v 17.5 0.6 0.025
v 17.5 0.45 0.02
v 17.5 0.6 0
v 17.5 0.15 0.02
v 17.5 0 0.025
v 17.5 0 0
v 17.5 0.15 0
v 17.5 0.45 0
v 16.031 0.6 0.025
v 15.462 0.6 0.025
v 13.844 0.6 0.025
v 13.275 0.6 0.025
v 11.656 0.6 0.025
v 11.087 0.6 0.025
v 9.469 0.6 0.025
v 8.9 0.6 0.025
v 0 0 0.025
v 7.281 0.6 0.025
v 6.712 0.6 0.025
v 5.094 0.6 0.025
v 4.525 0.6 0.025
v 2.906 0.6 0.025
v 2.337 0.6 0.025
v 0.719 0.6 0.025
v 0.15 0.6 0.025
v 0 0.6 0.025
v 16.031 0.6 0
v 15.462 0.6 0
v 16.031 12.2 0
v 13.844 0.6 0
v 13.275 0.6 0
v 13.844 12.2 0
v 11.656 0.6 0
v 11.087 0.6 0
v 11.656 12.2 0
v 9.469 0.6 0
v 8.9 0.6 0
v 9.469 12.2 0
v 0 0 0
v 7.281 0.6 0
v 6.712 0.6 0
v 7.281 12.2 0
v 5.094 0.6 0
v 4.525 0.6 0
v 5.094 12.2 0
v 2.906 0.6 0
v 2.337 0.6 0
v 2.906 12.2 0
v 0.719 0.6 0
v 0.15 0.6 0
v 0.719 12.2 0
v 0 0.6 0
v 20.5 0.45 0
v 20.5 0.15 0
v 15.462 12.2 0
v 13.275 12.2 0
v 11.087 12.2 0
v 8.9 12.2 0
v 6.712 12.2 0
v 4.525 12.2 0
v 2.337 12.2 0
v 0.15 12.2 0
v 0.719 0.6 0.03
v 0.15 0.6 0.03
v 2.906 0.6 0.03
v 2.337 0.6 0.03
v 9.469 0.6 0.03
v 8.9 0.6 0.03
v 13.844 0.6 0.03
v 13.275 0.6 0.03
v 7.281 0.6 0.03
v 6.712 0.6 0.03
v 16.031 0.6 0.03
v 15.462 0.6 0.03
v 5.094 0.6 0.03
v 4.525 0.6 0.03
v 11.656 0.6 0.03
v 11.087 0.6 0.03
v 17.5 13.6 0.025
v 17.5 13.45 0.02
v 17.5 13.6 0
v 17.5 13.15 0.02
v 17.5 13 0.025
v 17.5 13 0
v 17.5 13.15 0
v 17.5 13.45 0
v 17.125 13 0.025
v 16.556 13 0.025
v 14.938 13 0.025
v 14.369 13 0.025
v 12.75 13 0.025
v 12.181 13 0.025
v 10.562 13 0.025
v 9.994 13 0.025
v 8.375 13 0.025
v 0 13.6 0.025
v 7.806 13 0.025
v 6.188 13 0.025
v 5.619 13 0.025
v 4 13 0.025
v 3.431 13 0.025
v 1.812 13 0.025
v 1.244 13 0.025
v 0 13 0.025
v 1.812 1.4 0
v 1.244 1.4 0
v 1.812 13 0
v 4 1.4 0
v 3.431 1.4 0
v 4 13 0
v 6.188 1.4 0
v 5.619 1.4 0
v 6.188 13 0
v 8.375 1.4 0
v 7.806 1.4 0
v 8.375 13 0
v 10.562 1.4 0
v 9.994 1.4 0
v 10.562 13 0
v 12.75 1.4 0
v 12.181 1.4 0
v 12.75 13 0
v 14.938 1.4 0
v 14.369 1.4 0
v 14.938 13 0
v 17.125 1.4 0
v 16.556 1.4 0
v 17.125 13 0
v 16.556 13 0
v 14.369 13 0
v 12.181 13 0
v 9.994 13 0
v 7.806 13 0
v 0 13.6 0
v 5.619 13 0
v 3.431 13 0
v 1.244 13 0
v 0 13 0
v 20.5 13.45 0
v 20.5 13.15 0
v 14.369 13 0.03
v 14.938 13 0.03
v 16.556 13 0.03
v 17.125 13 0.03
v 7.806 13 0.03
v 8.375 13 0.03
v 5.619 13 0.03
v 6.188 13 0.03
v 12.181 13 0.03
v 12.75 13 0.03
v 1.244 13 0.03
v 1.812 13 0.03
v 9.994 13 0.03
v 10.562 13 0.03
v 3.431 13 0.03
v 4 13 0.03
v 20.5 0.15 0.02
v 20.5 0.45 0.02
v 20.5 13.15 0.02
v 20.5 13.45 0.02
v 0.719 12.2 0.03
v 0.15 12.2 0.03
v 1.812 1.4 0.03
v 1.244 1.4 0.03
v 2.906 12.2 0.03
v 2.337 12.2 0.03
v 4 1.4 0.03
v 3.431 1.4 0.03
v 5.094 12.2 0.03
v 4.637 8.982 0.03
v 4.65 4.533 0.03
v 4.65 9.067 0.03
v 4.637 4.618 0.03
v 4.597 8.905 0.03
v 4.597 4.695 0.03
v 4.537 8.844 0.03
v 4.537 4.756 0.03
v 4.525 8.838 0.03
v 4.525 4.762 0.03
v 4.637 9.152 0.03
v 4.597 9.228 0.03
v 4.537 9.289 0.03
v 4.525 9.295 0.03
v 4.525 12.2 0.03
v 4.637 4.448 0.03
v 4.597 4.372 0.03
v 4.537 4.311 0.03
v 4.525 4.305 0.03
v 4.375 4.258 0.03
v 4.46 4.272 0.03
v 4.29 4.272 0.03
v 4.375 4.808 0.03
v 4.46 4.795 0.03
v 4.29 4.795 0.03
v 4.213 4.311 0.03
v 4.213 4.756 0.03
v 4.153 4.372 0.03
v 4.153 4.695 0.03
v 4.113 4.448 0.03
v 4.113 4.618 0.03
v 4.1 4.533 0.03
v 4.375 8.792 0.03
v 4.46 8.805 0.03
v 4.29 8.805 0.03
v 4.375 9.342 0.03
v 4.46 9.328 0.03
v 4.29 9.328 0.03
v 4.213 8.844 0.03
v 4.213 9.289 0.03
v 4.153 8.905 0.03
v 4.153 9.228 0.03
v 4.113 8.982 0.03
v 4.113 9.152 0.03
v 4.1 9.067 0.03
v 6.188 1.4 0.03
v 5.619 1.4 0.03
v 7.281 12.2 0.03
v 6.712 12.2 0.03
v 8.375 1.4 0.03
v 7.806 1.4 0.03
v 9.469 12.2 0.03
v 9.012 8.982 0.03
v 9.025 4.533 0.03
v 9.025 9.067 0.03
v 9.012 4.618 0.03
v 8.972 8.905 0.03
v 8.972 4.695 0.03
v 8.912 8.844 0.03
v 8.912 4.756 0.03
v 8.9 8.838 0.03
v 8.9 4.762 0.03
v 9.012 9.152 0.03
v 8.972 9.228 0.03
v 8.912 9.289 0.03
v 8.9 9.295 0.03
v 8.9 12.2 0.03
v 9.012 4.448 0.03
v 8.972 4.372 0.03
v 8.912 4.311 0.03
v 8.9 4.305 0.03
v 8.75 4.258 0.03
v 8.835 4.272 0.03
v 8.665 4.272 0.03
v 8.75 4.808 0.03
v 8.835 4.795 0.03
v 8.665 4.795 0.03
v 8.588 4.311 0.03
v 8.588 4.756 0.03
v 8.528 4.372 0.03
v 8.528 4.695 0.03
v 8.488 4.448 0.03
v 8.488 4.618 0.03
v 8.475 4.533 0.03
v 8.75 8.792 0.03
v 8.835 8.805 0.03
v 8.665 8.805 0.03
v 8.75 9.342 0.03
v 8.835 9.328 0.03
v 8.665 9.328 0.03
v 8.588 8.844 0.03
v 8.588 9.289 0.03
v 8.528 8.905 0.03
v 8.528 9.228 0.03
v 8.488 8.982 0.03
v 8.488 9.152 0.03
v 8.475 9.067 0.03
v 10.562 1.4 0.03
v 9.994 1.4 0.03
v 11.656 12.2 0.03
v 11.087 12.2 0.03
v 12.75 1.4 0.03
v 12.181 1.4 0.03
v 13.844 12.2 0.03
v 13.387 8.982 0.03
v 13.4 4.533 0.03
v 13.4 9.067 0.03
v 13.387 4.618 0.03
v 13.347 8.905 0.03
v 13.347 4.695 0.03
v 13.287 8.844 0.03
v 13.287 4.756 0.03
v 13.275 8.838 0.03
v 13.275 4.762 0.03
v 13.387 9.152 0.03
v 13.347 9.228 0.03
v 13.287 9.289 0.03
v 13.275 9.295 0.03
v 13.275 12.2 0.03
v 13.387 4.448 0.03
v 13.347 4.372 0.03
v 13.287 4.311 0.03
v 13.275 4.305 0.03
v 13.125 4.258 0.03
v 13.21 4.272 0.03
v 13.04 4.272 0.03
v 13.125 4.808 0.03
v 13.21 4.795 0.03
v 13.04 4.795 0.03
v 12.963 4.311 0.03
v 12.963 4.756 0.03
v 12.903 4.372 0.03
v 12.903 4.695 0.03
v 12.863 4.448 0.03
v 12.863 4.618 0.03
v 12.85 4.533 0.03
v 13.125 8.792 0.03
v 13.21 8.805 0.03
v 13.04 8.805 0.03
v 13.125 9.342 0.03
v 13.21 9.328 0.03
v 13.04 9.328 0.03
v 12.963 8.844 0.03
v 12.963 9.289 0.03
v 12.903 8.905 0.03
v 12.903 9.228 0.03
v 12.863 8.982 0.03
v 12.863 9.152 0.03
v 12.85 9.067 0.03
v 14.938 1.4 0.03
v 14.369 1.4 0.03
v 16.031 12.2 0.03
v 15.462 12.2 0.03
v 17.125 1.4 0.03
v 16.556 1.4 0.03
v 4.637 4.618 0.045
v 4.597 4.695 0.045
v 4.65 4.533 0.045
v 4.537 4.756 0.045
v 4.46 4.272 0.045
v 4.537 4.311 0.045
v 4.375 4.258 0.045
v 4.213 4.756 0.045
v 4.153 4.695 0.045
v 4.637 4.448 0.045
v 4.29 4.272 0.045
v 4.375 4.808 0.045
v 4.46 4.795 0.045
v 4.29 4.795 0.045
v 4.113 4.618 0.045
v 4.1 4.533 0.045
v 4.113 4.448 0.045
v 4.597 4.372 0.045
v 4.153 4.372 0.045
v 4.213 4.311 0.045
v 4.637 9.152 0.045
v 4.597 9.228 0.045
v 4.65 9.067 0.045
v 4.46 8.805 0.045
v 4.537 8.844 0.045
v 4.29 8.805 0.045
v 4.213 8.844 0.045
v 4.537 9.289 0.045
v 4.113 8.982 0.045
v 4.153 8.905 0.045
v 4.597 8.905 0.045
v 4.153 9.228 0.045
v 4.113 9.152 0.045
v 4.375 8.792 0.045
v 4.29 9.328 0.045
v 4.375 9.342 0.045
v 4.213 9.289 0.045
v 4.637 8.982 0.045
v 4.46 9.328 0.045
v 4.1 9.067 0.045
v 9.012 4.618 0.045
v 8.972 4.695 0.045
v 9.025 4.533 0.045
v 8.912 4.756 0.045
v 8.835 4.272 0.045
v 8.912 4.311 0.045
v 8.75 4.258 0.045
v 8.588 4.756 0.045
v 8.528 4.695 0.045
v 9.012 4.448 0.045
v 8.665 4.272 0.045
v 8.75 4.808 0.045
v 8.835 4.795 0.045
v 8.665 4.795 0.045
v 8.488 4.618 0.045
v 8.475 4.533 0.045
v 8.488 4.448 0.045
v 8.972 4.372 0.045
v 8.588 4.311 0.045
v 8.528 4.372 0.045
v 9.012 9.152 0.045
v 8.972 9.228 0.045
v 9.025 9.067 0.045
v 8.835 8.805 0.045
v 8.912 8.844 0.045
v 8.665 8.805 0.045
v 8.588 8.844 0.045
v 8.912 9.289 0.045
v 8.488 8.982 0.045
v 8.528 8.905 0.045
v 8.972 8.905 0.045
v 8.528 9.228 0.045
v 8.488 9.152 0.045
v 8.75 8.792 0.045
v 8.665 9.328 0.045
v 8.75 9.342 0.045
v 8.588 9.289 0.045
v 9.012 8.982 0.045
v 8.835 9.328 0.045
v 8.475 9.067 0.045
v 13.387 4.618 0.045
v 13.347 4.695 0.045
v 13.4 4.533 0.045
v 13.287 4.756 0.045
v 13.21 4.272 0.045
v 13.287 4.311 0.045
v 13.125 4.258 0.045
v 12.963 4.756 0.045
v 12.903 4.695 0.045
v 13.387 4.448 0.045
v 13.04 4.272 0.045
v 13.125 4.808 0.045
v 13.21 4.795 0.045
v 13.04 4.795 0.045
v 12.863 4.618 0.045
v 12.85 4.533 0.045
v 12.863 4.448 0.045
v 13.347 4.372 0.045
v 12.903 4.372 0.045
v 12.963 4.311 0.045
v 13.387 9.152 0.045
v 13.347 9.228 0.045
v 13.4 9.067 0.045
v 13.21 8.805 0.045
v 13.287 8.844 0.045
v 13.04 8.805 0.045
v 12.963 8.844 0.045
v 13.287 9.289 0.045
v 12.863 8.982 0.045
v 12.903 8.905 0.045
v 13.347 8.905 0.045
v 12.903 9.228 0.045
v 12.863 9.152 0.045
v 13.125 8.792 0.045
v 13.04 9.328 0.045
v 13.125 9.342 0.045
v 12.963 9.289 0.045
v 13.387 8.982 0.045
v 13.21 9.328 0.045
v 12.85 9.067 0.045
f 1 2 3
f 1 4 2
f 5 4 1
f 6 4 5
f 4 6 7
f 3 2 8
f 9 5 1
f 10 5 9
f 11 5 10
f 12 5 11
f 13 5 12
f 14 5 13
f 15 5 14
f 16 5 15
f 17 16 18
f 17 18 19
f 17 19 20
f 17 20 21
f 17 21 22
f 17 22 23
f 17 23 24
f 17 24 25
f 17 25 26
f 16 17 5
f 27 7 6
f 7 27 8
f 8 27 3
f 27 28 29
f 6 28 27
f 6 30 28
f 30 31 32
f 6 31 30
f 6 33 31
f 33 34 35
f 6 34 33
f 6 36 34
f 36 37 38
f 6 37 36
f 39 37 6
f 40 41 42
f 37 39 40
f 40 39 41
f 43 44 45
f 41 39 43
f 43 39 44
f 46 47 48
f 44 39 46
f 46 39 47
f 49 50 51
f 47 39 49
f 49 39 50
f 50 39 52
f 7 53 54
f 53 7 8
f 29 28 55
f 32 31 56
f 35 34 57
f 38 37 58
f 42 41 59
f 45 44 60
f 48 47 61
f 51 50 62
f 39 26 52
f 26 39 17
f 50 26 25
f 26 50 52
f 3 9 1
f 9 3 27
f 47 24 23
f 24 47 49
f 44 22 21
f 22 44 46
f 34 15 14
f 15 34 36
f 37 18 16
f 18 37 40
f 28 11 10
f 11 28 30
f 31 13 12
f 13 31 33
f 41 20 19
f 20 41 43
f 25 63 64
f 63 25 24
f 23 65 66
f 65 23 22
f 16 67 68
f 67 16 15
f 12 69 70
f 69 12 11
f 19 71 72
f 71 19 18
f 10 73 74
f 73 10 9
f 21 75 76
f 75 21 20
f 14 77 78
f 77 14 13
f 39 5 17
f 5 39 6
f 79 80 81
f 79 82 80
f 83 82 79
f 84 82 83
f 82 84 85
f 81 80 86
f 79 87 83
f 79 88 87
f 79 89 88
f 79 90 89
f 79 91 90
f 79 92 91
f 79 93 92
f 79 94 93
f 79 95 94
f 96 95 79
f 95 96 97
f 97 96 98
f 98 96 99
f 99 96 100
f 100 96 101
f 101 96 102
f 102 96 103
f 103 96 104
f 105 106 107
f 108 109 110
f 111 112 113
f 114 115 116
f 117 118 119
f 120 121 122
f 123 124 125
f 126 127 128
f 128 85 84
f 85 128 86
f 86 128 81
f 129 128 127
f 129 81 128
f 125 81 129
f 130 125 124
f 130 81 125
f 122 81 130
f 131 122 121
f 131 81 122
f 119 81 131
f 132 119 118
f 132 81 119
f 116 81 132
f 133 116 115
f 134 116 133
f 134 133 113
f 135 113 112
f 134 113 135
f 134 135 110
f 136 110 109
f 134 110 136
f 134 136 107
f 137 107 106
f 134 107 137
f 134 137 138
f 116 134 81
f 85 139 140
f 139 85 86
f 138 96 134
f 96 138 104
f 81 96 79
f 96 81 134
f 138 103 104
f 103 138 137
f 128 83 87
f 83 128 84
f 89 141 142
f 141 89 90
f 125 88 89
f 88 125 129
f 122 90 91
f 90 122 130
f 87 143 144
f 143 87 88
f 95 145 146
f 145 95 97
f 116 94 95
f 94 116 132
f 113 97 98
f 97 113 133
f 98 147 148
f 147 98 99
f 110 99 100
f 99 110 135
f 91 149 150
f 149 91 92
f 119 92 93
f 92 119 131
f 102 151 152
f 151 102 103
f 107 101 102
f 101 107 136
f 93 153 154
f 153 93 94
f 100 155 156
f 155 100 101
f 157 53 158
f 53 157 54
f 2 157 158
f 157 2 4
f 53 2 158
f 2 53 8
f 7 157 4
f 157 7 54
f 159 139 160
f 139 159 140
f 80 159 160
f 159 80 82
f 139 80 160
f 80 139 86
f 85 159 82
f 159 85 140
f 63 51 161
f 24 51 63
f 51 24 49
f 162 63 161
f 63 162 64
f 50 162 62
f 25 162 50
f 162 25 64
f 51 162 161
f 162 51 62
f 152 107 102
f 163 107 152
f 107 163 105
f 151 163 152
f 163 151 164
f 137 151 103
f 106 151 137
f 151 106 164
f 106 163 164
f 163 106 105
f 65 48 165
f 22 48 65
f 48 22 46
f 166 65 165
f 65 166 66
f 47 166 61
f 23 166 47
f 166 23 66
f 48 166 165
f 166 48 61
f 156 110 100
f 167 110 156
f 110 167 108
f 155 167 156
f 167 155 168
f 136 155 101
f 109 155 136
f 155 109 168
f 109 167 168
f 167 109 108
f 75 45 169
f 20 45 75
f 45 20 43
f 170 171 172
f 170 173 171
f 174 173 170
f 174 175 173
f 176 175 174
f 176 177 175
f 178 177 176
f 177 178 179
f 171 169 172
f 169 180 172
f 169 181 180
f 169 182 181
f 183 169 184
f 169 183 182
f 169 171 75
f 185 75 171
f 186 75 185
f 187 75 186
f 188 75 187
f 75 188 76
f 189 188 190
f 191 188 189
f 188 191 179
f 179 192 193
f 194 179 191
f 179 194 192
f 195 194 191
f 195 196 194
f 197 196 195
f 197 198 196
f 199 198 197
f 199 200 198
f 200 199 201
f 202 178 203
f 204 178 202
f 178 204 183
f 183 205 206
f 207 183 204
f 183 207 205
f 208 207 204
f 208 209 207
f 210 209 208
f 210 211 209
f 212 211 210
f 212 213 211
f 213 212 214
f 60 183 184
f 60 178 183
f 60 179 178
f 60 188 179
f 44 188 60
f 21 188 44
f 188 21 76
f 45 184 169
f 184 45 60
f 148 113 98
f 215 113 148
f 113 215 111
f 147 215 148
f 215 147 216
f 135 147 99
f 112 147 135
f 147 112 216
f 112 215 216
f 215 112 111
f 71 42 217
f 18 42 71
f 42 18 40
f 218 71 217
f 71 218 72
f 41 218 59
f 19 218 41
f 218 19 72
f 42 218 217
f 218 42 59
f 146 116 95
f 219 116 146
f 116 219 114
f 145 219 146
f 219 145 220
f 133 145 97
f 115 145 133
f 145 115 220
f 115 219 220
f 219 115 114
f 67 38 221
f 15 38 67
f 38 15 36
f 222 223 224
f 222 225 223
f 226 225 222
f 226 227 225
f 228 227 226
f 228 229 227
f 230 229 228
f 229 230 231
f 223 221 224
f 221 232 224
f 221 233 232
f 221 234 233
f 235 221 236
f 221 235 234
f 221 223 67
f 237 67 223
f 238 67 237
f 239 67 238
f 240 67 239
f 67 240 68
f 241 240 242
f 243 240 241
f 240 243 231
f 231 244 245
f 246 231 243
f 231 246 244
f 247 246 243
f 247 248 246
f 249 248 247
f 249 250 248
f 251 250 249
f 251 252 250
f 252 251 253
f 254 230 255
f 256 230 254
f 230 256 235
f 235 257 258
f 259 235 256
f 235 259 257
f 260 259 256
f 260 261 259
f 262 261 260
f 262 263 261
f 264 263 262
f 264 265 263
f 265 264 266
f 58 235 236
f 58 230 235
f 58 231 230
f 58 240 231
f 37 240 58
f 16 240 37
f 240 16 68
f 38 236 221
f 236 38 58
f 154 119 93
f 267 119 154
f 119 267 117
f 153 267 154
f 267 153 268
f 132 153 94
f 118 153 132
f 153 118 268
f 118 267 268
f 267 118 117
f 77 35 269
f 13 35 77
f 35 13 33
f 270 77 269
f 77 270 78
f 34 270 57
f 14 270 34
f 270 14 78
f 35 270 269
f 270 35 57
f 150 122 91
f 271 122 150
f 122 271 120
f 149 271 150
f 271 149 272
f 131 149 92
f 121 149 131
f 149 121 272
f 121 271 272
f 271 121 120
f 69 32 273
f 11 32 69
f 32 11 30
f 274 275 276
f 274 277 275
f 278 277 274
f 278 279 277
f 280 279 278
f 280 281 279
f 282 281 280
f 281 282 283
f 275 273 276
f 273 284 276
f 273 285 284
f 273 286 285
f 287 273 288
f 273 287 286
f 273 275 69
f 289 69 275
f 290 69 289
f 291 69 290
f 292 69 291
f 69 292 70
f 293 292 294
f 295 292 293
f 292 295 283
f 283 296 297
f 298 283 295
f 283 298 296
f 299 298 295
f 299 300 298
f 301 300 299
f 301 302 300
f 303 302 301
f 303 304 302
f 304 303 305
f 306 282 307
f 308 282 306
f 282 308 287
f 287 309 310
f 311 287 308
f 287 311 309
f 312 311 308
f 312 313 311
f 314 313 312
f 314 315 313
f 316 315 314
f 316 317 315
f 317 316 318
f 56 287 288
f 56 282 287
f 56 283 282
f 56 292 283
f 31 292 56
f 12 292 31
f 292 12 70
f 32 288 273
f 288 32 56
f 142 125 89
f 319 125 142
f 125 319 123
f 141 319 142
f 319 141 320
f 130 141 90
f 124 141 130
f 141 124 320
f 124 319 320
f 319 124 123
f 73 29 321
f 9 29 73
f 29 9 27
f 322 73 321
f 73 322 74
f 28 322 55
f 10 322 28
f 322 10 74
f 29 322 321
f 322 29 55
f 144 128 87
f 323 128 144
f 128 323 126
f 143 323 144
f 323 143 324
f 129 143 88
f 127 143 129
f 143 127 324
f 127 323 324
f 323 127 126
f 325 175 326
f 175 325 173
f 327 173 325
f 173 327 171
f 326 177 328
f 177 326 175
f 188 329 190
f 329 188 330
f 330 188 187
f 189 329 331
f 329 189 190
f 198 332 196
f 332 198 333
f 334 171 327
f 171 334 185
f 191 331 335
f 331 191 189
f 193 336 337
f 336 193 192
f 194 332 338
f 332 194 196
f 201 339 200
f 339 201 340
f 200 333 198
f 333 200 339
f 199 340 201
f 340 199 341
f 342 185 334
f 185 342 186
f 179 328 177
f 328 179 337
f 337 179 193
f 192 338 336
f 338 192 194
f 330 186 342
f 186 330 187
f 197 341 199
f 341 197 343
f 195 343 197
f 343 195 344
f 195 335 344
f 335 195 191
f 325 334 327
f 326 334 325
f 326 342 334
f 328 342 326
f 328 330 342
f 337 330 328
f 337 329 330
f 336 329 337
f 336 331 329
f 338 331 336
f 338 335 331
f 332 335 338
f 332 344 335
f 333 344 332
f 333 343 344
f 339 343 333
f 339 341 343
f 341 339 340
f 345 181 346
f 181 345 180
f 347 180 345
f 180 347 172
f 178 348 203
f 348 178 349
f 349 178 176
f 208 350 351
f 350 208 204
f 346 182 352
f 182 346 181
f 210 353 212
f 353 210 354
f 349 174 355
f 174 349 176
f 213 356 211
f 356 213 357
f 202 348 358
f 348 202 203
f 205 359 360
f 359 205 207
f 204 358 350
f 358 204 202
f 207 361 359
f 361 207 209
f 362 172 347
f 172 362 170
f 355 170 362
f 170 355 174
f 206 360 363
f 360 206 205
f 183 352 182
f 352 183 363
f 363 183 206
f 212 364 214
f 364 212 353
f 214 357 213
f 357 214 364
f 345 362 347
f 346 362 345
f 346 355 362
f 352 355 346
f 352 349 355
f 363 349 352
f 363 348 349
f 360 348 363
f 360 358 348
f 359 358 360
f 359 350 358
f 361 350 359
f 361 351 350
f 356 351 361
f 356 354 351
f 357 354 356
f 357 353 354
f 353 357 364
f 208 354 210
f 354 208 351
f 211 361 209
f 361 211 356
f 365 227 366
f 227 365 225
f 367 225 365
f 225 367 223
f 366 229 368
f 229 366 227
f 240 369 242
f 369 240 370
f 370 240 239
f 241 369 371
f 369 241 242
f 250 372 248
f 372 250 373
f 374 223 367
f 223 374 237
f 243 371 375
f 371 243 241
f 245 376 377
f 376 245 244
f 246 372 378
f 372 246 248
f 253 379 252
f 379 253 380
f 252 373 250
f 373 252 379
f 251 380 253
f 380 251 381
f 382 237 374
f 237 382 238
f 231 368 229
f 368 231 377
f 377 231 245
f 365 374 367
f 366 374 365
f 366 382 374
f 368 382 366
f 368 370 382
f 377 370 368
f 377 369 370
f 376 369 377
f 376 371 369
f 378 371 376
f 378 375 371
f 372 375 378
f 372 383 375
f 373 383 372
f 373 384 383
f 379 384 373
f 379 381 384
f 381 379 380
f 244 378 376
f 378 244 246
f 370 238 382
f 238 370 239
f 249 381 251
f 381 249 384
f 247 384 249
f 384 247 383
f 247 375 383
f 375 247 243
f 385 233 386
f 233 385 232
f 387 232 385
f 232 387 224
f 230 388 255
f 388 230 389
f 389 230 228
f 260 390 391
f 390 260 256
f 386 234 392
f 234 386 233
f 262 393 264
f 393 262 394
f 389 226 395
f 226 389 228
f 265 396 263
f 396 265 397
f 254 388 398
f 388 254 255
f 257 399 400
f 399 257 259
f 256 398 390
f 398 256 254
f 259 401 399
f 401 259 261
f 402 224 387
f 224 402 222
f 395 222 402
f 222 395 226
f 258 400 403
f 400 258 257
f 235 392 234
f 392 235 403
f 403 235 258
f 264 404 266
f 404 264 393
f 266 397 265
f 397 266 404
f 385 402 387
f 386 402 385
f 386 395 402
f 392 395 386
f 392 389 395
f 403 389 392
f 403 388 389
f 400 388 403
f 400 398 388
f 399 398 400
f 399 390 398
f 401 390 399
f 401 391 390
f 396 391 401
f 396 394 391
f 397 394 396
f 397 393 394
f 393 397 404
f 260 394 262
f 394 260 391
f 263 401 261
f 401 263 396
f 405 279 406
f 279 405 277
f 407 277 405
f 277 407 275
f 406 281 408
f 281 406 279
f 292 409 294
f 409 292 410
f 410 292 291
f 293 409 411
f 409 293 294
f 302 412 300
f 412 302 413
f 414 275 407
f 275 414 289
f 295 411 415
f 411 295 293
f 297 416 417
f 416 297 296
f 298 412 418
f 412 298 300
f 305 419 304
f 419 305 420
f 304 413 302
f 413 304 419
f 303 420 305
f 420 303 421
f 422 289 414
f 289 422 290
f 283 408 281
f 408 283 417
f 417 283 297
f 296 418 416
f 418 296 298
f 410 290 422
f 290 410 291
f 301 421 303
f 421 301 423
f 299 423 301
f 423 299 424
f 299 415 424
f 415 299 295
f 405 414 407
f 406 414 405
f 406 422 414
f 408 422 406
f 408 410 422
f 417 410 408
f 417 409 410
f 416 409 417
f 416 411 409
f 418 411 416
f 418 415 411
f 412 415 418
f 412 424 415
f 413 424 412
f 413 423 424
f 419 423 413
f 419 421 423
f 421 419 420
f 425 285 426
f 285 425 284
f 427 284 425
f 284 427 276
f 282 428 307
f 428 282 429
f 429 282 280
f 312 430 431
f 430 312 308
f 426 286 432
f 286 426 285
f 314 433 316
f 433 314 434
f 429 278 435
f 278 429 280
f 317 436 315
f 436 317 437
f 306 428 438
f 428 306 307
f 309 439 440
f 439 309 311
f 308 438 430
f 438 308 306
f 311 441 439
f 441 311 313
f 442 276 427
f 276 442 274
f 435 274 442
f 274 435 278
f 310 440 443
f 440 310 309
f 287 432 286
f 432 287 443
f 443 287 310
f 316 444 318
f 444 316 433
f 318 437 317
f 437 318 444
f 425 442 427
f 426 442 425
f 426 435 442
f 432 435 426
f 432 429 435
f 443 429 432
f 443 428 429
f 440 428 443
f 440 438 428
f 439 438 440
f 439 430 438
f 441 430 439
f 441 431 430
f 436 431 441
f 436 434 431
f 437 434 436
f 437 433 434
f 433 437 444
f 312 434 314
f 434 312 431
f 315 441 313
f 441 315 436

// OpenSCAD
// file: ../Common/params.scad
// =========================================================================
// PencilAI - Common Parameters, Colors & Utility Library
// File: CAD Modelling/Common/params.scad
// =========================================================================

// --- Resolution Settings ---
$fn = 64;

// --- Physical Strip Dimensions (mm) ---
STRIP_LEN        = 54.0;   // Length of flexible tape (wraps ~1.9x on 9mm barrel)
STRIP_WID        = 20.0;   // Width of tape along the pen axis (grip zone height)
STRIP_CORNER_R   = 2.0;    // Rounded corner radius to prevent peeling

// --- Layer Heights & Z-Stackup (mm) ---
THICK_ADHESIVE   = 0.055;  // Skin-safe medical acrylic adhesive
THICK_KAPTON     = 0.025;  // Flexible Polyimide film substrate (25 um)
THICK_BASE       = THICK_ADHESIVE + THICK_KAPTON; // 0.080 mm base

THICK_COPPER     = 0.020;  // Etched copper traces (1/2 oz / 18-20 um)
THICK_GOLD       = 0.005;  // ENIG surface finish plating
THICK_CARBON     = 0.030;  // Screen-printed carbon resistive ink (30 um)
THICK_SPACER     = 0.015;  // Dielectric spacer dot height

THICK_TPU_SKIN   = 0.450;  // Translucent matte TPU outer protective grip film
THICK_TOTAL_MAX  = 0.530;  // Target total profile thickness: 0.53 mm

// --- Component Dimensions (mm) ---
// ST LIS2DH12 Ultra-low-power 3-axis accelerometer (WLCSP-12)
ACCEL_LEN        = 1.60;
ACCEL_WID        = 1.60;
ACCEL_H          = 0.40;   // Ultra-thin WLCSP package
ACCEL_BALL_PITCH = 0.40;   // 3x4 solder ball matrix
ACCEL_BALL_DIA   = 0.22;

// BLE Beacon SoC (InPlay IN100 / Nordic nRF52810 WLCSP)
BLE_LEN          = 2.20;
BLE_WID          = 2.20;
BLE_H            = 0.35;   // 0.35 mm profile
BLE_BALL_PITCH   = 0.45;   // 4x4 solder ball matrix
BLE_BALL_DIA     = 0.24;

// Ultra-Thin Printed Zinc-Manganese (Zn-Mn) Flexible Battery
BAT_LEN          = 16.5;   // Main pouch length
BAT_WID          = 12.6;   // Main pouch width
BAT_H            = 0.45;   // Printed paper battery thickness (0.45 mm)
BAT_SEAL_MARGIN  = 1.0;    // Perimeter foil crimp seal width
BAT_TAB_LEN      = 2.4;    // Terminal connector tab length
BAT_TAB_WID      = 1.2;    // Terminal tab width

// Interdigitated Carbon FSR Pinch Zone
FSR_LEN          = 17.5;
FSR_WID          = 13.6;
FSR_FINGERS      = 16;
FSR_BUS_WID      = 0.60;

// Serpentine 2.4 GHz Antenna
ANT_LOOPS        = 6;
ANT_STEP         = 1.40;
ANT_AMP          = 2.40;
ANT_TRACE_WID    = 0.35;

// Reference Pen
PEN_DIAMETER_DEFAULT = 9.0; // Standard ballpoint barrel (mm)

// --- Color Palette (RGBA) ---
C_KAPTON         = [0.85, 0.48, 0.08, 0.88]; // Translucent Amber Polyimide
C_ADHESIVE       = [0.95, 0.95, 0.92, 0.50]; // Clear skin-safe acrylic adhesive
C_RELEASE_LINER  = [0.98, 0.98, 0.96, 0.95]; // White silicone-coated pull tab
C_TPU_SKIN       = [0.18, 0.19, 0.22, 0.55]; // Translucent Charcoal Matte TPU
C_TPU_OPAQUE     = [0.14, 0.15, 0.17, 1.00]; // Grip ridges / tactile accents
C_COPPER         = [0.85, 0.45, 0.22, 1.00]; // Raw Etched Copper
C_GOLD           = [0.92, 0.74, 0.20, 1.00]; // ENIG Gold Plating
C_CARBON         = [0.12, 0.12, 0.13, 0.98]; // Screen-Printed Carbon Ink
C_DIELECTRIC     = [0.20, 0.65, 0.40, 0.75]; // Green/Teal Dielectric Spacer
C_SILICON        = [0.09, 0.10, 0.12, 1.00]; // WLCSP Mirror Silicon Die
C_SOLDER         = [0.76, 0.78, 0.82, 1.00]; // SAC305 Lead-Free Solder
C_CERAMIC        = [0.70, 0.58, 0.46, 1.00]; // 0201 MLCC Brown Ceramic
C_BATTERY_FOIL   = [0.80, 0.82, 0.85, 1.00]; // Hermetic Aluminum/Poly Pouch
C_BATTERY_SEAL   = [0.65, 0.67, 0.70, 1.00]; // Crimped Pouch Flange
C_BAT_ACCENT     = [0.15, 0.45, 0.75, 1.00]; // Insulator Layer / Branding
C_PEN_BARREL     = [0.93, 0.94, 0.96, 0.90]; // Smooth Polycarbonate Barrel
C_PEN_CHROME     = [0.84, 0.86, 0.89, 1.00]; // Mirror Chrome Trim
C_PEN_BRASS      = [0.86, 0.70, 0.28, 1.00]; // Machined Brass Tip Collar
C_PEN_BALL       = [0.35, 0.36, 0.38, 1.00]; // Tungsten Carbide Ball
C_PEN_INK        = [0.05, 0.10, 0.35, 1.00]; // Blue Ink Column inside refill

// --- Reusable Geometric Modules ---

// 2D Rounded Rectangle (Centered or Corner Origin)
module rounded_rect_2d(length, width, radius, center = false) {
    tx = center ? -length / 2 : 0;
    ty = center ? -width / 2 : 0;
    translate([tx, ty])
        offset(r = radius)
            offset(delta = -radius)
                square([length, width]);
}

// 3D Rounded Extruded Plate
module rounded_box(length, width, height, radius, center = false) {
    linear_extrude(height = height)
        rounded_rect_2d(length, width, radius, center = center);
}

// Spherical Solder Ball
module solder_ball(diameter) {
    color(C_SOLDER)
        sphere(d = diameter, $fn = 32);
}

// SMD 0201 / 01005 Passive Component (Capacitor / Inductor / Resistor)
module smd_passive_0201(len = 0.60, wid = 0.30, height = 0.30, body_color = C_CERAMIC) {
    term_len = 0.15;
    // Central Ceramic/Ferrite Body
    color(body_color)
        translate([term_len, 0, 0])
            cube([len - 2 * term_len, wid, height]);
    // Silver End Terminations
    color(C_SOLDER) {
        cube([term_len, wid, height]);
        translate([len - term_len, 0, 0])
            cube([term_len, wid, height]);
    }
}

// Circular Fiducial Alignment Marker (for high-precision flex assembly)
module fiducial_marker(diameter = 1.0, copper_h = THICK_COPPER) {
    color(C_GOLD)
        cylinder(d = diameter, h = copper_h, $fn = 32);
    color(C_KAPTON)
        difference() {
            cylinder(d = diameter * 2.2, h = copper_h + 0.001, $fn = 32);
            cylinder(d = diameter * 1.4, h = copper_h + 0.002, $fn = 32);
        }
}
// main file
// =========================================================================
// PencilAI - Interdigitated Carbon FSR Pressure Sensor
// File: CAD Modelling/Sensors/fsr_pressure_sensor.scad
// =========================================================================

include <../Common/params.scad>

// --- View Controls (when rendered directly) ---
show_busbars      = true;   // Gold outer collector busbars & lead traces
show_carbon_grid  = true;   // Interlocking screen-printed carbon-ink fingers
show_spacer_dots  = true;   // Dielectric micro-spacer dots for threshold control

module fsr_sensor(
    x = 0,
    y = 0,
    z = THICK_BASE,
    length = FSR_LEN,
    width = FSR_WID,
    fingers = FSR_FINGERS
) {
    translate([x, y, z]) {
        // 1. Dual ENIG Gold Busbars & Sense Feeds
        if (show_busbars) {
            color(C_GOLD) {
                // Bottom Busbar
                cube([length, FSR_BUS_WID, THICK_COPPER + THICK_GOLD]);

                // Top Busbar
                translate([0, width - FSR_BUS_WID, 0])
                    cube([length, FSR_BUS_WID, THICK_COPPER + THICK_GOLD]);

                // Connecting feed leads running towards SoC
                translate([length, FSR_BUS_WID / 2 - 0.15, 0])
                    cube([3.0, 0.30, THICK_COPPER]);
                translate([length, width - FSR_BUS_WID / 2 - 0.15, 0])
                    cube([3.0, 0.30, THICK_COPPER]);
            }
        }

        // 2. Interlocking Screen-Printed Carbon-Ink Fingers (30 um)
        if (show_carbon_grid) {
            color(C_CARBON) {
                pitch = length / fingers;
                finger_wid = pitch * 0.52;
                overlap_span = width - 2 * FSR_BUS_WID - 0.8;

                for (i = [0 : fingers - 1]) {
                    fx = i * pitch + 0.15;
                    if (i % 2 == 0) {
                        // Finger extending upward from bottom busbar
                        translate([fx, FSR_BUS_WID, 0])
                            cube([finger_wid, overlap_span, THICK_CARBON]);
                    } else {
                        // Finger extending downward from top busbar
                        translate([fx, width - FSR_BUS_WID - overlap_span, 0])
                            cube([finger_wid, overlap_span, THICK_CARBON]);
                    }
                }
            }
        }

        // 3. Dielectric Micro-Spacer Dots
        // Keeps fingers separated during zero touch so the sensor only triggers on deliberate finger grip
        if (show_spacer_dots) {
            color(C_DIELECTRIC) {
                pitch_x = length / 4;
                pitch_y = width / 3;
                for (ix = [1 : 3]) {
                    for (iy = [1 : 2]) {
                        translate([ix * pitch_x, iy * pitch_y, THICK_CARBON])
                            cylinder(d = 0.55, h = THICK_SPACER, $fn = 20);
                    }
                }
            }
        }
    }
}

// Standalone Render
fsr_sensor(x = 0, y = 0, z = 0);
